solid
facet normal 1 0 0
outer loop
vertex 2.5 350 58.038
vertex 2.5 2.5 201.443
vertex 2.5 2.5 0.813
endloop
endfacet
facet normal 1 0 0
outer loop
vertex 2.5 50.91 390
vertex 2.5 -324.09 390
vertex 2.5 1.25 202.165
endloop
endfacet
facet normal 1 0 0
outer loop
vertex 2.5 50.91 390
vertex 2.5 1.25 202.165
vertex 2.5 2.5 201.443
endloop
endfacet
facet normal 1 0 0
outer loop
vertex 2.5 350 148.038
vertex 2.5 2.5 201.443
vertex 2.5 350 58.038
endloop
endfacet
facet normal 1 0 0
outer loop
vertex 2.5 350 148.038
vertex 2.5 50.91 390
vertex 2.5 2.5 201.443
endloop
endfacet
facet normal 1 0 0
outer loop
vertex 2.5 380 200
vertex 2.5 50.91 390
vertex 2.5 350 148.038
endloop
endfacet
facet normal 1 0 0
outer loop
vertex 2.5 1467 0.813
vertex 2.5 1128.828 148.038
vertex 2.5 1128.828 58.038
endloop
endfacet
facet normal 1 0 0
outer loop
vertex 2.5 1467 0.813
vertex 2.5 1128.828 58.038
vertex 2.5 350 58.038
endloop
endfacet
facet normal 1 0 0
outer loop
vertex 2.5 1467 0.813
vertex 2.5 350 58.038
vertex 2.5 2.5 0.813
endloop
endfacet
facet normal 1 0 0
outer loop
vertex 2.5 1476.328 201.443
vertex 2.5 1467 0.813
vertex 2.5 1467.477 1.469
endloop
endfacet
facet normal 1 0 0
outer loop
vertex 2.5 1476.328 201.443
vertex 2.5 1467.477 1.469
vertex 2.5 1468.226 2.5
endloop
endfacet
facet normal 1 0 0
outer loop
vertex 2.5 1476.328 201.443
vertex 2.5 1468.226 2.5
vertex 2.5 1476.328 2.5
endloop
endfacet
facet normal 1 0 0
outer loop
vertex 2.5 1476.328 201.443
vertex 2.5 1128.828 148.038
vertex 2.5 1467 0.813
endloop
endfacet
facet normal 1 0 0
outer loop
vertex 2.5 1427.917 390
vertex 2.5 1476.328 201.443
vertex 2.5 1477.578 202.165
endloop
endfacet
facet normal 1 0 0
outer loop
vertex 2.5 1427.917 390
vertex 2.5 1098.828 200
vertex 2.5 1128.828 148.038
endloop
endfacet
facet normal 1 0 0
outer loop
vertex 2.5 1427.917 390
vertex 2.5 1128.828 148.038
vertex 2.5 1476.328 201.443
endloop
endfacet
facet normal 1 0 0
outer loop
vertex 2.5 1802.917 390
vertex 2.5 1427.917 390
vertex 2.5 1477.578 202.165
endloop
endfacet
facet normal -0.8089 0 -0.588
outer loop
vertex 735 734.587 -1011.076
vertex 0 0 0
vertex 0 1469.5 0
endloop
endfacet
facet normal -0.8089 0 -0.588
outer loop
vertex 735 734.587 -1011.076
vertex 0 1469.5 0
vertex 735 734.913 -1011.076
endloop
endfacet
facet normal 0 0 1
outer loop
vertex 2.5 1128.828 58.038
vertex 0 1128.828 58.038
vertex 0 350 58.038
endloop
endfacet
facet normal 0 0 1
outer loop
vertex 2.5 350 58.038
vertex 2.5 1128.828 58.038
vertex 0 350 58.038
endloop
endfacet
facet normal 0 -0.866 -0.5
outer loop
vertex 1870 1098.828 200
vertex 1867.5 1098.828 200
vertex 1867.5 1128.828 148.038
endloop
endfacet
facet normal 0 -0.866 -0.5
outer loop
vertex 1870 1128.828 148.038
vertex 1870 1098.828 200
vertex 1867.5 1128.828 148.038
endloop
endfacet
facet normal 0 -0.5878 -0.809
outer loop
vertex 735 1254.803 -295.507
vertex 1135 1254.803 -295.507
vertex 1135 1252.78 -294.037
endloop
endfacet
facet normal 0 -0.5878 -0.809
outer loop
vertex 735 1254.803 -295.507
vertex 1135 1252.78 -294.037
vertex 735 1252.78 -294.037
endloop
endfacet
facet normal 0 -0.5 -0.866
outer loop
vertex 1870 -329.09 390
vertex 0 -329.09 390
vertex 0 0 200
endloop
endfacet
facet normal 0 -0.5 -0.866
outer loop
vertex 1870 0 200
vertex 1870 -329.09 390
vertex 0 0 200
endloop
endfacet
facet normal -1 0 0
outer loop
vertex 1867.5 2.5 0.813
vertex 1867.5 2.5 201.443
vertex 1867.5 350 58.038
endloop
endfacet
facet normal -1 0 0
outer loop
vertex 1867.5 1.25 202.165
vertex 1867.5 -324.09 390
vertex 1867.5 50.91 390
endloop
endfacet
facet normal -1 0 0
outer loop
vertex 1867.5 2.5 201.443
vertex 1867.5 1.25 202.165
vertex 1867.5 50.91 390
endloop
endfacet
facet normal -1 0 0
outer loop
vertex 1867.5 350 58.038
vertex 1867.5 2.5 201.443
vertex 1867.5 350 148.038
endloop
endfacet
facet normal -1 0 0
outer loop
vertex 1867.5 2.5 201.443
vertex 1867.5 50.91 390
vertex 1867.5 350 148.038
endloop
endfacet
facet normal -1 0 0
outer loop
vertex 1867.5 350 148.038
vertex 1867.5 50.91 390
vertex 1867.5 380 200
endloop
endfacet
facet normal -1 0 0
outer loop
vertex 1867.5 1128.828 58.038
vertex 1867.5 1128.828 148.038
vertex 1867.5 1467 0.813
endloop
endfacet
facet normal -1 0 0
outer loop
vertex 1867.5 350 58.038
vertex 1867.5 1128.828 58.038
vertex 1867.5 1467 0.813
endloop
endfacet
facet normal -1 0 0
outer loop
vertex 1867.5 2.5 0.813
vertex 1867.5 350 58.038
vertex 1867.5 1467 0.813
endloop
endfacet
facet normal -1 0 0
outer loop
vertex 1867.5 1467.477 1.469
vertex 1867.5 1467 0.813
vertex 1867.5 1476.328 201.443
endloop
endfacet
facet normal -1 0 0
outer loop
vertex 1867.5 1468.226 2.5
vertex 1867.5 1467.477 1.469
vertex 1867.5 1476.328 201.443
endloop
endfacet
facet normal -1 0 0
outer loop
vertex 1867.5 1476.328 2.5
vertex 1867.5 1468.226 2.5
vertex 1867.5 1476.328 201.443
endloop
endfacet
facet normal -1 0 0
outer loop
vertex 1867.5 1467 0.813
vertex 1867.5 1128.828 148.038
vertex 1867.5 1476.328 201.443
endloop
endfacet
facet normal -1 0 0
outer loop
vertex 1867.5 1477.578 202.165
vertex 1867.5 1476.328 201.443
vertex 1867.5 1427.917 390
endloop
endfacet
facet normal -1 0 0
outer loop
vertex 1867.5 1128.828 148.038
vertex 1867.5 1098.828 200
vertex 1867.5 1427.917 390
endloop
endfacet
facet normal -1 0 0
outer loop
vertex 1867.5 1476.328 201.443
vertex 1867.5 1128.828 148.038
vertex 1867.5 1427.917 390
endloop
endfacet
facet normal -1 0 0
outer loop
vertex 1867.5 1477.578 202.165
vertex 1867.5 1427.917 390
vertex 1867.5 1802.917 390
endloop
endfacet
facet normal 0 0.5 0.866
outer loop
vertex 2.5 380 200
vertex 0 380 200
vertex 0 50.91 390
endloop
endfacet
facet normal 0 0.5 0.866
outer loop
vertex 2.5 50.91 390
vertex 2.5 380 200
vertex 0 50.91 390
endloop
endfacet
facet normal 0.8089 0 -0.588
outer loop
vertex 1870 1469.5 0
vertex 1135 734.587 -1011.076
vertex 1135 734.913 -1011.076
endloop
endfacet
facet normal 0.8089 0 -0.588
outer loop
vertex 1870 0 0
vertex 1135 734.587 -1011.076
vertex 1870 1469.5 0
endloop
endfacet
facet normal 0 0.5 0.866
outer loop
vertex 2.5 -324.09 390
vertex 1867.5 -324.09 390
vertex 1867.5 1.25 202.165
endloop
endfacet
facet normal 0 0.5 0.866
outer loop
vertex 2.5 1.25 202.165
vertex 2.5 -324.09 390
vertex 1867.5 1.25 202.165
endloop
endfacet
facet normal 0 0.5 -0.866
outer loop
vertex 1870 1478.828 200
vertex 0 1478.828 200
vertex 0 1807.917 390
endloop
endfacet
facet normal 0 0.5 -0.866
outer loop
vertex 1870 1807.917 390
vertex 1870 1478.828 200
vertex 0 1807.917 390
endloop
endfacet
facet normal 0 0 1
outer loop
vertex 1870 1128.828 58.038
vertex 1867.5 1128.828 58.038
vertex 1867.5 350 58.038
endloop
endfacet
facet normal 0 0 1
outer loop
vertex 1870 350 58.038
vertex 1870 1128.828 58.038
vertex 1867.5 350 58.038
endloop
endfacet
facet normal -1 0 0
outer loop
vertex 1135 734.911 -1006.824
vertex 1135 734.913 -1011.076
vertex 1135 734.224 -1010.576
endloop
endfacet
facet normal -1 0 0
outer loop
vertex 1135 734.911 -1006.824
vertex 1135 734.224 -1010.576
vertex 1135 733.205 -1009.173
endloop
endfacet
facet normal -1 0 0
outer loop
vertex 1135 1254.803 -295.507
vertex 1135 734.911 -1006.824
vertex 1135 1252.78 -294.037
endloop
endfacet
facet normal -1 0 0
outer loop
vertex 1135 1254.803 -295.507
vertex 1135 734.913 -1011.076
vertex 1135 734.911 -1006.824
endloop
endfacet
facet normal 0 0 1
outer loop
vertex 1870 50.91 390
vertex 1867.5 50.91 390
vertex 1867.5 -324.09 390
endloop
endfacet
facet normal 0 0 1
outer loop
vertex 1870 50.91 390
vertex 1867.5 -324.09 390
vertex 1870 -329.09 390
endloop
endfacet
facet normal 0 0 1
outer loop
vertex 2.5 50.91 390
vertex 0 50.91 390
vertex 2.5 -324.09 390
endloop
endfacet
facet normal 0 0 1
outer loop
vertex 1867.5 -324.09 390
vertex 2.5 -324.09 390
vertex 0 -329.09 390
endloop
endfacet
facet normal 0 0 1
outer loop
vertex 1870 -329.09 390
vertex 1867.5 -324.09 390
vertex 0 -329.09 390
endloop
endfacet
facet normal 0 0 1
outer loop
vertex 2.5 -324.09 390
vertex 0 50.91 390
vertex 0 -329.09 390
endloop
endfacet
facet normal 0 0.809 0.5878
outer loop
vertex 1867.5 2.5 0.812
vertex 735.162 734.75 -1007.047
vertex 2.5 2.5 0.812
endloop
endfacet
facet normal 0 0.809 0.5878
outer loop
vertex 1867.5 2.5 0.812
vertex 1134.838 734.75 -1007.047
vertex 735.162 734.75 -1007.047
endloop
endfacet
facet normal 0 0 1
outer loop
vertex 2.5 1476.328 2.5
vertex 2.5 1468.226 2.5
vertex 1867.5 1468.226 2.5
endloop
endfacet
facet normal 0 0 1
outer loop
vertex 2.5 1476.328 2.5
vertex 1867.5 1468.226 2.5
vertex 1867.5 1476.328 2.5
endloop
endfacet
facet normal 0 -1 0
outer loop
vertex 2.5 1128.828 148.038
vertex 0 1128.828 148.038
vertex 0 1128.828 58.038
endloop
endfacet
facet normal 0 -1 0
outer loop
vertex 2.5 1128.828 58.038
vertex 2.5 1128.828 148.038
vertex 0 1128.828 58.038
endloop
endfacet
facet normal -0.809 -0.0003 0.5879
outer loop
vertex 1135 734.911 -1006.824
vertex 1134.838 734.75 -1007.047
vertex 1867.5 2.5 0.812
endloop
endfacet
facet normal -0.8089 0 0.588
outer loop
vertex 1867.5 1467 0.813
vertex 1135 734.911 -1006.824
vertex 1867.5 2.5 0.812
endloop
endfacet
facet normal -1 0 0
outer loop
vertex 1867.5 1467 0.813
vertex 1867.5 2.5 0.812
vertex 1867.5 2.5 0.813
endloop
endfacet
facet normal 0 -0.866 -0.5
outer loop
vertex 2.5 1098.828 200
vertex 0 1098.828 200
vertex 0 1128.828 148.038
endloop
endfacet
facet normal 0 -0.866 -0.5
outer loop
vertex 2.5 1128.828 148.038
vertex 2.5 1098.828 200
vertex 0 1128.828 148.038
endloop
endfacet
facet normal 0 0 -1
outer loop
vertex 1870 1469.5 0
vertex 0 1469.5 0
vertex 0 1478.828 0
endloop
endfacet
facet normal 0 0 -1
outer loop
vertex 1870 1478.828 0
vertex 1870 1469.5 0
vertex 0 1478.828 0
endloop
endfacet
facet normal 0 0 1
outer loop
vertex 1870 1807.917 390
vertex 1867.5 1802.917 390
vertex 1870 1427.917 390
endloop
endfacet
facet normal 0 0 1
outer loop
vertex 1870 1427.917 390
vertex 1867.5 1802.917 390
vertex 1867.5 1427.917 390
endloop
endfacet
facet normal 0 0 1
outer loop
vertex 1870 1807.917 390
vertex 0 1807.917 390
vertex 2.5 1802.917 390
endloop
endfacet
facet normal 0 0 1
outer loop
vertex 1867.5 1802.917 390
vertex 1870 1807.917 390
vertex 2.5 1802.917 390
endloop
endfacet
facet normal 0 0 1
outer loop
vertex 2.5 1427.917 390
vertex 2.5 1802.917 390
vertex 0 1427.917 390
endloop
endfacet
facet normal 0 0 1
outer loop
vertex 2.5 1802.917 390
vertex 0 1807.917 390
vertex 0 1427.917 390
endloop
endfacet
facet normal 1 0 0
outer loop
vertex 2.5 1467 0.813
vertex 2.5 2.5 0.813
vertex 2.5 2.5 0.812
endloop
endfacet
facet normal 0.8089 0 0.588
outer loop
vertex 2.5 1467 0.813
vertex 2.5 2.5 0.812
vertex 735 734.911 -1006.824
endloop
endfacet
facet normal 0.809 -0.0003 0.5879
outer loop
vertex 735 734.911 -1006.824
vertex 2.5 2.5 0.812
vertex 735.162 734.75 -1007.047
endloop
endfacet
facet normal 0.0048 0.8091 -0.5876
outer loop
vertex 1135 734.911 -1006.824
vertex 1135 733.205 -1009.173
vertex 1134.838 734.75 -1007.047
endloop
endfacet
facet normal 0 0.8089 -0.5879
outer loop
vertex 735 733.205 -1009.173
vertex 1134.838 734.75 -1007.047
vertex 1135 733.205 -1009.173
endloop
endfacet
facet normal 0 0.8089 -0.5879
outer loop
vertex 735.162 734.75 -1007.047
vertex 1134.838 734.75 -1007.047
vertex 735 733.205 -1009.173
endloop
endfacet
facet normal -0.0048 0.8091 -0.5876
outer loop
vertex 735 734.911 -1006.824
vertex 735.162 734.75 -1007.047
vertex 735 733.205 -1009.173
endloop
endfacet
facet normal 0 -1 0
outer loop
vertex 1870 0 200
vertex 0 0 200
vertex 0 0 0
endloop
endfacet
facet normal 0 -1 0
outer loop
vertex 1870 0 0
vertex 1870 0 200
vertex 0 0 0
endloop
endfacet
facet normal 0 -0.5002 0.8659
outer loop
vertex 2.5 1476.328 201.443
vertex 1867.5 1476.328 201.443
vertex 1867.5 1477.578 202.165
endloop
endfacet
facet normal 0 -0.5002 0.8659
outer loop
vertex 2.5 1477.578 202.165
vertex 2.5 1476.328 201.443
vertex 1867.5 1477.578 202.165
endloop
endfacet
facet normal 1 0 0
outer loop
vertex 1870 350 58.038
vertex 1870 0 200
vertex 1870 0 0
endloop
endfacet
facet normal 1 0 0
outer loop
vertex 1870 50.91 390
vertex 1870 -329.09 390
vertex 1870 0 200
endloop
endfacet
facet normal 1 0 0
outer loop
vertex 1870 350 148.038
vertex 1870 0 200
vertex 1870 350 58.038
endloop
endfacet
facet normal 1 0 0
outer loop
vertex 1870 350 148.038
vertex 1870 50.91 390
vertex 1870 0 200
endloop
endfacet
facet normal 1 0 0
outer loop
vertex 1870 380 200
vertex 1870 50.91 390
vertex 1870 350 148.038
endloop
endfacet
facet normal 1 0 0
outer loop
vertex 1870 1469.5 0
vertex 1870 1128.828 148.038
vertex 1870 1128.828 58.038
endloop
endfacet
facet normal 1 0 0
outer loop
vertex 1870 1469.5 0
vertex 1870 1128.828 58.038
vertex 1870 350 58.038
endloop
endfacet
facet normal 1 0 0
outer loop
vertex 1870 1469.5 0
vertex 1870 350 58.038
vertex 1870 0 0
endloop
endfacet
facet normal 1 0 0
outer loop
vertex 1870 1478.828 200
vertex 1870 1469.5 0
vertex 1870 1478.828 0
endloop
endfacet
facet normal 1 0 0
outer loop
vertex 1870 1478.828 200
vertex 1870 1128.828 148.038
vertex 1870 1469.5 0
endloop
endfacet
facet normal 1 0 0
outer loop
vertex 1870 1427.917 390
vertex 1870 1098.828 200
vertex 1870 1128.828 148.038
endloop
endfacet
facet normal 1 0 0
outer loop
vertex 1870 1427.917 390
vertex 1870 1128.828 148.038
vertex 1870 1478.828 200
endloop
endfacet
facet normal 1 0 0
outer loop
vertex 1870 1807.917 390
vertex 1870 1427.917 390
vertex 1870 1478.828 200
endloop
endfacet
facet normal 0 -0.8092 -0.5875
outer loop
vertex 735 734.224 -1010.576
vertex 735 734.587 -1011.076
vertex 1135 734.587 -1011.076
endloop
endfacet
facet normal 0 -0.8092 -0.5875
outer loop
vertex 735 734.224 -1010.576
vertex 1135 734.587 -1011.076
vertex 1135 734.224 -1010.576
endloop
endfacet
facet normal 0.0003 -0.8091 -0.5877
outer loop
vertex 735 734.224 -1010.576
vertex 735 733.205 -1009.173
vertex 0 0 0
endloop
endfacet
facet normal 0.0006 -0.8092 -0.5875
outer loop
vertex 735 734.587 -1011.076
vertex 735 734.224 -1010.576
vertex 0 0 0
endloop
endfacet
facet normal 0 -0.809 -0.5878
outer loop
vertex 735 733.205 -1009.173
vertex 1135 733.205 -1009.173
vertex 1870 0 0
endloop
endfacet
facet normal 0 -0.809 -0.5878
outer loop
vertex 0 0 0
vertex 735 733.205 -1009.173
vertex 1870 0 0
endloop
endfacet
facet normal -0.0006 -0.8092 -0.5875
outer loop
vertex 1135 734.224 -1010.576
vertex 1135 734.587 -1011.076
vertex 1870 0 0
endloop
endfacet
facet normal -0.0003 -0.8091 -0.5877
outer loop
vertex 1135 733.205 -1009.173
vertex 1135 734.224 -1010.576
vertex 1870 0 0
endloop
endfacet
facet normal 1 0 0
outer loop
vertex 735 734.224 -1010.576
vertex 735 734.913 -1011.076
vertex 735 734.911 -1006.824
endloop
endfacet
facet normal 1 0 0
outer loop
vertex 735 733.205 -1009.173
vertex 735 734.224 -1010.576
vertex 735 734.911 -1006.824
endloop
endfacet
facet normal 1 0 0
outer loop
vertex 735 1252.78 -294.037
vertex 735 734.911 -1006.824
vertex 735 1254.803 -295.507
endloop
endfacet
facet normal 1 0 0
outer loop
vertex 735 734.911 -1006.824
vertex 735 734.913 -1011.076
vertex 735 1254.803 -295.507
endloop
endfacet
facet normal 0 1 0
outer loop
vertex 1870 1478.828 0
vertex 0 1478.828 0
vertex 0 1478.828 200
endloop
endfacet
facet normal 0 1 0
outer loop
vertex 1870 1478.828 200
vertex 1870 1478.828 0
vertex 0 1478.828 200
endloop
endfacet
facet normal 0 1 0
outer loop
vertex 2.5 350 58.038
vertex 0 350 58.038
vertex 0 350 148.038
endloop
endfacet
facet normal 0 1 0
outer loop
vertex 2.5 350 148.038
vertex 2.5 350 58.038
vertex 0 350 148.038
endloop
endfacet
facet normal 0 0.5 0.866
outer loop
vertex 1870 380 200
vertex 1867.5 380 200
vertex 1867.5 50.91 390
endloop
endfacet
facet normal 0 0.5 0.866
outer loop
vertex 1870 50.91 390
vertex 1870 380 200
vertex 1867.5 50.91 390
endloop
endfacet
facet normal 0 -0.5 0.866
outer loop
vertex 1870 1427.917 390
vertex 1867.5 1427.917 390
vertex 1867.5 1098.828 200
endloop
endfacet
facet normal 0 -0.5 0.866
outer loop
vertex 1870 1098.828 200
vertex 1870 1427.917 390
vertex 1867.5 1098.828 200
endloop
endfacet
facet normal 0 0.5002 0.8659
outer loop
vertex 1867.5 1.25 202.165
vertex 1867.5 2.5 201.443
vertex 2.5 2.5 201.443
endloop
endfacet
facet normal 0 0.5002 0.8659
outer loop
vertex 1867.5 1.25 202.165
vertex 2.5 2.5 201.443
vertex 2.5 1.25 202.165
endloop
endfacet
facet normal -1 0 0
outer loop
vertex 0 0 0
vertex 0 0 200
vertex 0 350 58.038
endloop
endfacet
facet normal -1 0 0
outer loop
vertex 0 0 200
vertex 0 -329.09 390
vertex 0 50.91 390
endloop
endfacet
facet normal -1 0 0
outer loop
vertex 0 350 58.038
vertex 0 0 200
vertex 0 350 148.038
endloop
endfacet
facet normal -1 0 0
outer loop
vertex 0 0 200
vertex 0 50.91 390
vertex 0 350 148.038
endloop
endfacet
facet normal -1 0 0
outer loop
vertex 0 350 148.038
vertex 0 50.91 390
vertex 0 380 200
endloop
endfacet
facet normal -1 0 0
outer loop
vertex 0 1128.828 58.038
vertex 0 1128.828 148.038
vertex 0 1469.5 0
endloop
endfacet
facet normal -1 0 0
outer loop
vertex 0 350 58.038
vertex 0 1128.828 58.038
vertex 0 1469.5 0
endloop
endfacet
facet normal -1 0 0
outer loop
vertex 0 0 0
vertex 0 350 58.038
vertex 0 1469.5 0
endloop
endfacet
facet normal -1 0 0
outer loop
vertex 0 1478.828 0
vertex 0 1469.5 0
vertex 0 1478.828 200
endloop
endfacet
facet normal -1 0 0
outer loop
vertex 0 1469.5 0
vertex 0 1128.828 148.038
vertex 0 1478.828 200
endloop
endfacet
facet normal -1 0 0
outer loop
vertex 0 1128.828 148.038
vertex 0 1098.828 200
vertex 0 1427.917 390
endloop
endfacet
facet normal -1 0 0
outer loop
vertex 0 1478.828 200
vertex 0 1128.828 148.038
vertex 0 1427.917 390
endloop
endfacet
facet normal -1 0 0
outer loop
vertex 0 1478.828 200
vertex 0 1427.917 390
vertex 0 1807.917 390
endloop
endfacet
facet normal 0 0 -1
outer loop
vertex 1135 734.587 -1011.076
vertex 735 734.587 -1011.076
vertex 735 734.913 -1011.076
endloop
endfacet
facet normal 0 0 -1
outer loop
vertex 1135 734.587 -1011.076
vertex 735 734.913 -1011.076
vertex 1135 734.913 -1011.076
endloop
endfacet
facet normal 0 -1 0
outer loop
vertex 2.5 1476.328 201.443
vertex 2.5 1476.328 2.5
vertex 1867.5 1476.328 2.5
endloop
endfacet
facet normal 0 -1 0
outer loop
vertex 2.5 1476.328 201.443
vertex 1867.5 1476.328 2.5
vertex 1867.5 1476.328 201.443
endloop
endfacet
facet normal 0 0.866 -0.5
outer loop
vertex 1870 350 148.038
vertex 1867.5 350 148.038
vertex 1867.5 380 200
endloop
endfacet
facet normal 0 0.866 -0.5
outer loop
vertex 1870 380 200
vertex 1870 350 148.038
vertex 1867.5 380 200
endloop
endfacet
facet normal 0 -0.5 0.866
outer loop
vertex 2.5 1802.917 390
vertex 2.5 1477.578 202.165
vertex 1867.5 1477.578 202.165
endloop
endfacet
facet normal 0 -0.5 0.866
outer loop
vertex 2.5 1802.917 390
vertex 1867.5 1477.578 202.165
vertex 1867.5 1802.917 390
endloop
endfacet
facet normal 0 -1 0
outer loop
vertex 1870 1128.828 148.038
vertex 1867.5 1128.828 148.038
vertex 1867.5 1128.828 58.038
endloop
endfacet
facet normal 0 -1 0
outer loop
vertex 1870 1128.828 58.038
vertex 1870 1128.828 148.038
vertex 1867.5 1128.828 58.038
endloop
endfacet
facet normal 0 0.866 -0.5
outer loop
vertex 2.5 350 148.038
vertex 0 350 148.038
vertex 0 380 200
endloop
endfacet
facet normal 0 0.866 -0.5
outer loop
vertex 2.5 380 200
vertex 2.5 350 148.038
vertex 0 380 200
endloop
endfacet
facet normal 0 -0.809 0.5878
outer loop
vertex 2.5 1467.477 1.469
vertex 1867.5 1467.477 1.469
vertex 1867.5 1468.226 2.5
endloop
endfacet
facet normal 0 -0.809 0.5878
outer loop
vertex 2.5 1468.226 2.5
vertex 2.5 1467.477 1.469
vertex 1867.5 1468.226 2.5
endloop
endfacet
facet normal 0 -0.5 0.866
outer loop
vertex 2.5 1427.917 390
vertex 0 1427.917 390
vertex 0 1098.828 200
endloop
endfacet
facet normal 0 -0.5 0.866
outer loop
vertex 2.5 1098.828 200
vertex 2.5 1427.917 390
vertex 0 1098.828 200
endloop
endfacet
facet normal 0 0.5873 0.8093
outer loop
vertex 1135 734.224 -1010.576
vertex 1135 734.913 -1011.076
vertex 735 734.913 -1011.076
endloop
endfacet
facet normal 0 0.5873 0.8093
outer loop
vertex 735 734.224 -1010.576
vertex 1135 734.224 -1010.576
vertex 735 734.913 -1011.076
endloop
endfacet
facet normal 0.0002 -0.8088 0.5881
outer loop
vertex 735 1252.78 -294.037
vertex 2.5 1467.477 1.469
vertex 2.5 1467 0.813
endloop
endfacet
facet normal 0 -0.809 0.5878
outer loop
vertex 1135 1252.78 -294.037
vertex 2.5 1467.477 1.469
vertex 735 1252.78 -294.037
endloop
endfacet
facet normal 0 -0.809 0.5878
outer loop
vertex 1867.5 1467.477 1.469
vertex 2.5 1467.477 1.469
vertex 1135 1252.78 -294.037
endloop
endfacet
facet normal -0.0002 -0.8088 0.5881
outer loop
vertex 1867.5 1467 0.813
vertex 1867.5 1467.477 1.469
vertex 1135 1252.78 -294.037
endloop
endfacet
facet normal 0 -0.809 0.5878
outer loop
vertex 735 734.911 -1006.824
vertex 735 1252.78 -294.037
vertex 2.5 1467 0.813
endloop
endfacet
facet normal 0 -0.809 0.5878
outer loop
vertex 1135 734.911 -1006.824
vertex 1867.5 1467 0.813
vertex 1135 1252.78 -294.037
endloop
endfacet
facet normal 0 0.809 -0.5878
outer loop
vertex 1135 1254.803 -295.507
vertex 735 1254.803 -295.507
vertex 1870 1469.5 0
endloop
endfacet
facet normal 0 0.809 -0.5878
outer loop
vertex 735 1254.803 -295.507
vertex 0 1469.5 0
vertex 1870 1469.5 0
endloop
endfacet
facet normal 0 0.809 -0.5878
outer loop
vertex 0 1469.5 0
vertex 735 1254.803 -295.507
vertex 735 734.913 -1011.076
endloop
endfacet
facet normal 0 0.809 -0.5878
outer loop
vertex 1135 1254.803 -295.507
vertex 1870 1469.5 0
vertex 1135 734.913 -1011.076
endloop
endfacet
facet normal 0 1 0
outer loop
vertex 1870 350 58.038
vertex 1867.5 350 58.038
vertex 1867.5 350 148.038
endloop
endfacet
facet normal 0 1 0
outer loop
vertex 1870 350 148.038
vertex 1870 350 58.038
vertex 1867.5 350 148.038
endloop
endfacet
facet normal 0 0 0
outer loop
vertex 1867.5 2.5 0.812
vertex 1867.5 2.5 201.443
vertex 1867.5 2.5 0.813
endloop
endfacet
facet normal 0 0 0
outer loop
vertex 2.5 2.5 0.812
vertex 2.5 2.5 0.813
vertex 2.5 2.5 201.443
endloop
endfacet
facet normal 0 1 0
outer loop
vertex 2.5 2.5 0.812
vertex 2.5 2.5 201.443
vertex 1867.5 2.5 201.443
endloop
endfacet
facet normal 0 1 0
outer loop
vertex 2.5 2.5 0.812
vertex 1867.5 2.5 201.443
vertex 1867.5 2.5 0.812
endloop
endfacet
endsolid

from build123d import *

# Parameters (mm, degrees)
F0_W        = 1870
F0_H        = 1469.5
F1_DEPTH    = 1011.3
F3_DEPTH    = 1870.001
F6_DEPTH    = 1469.501
F8_DEPTH    = 1870
F9_T        = 2.5
F9_T3_DEPTH = 1875
F10_W       = 400
F10_H       = 884.4916457885
F11_DEPTH   = 2.5


# Not quite as in the source:
# - a shell that OpenCascade refuses in one call is made with other operations: the cavity is built on its own and cut out


with BuildPart() as f1:
    # F0 (on Top) → F1 (new body)
    with BuildSketch(Plane.XY):
        with Locations((935, 734.75)):
            Rectangle(F0_W, F0_H)
    extrude(amount=-F1_DEPTH)

    # F2 (on face) → F3 (cut, through all)
    with BuildSketch(Plane.YZ.offset(1870)):
        Polygon((734.75, -1011.3), (0, 0), (0, -1011.3), align=None)
        Polygon((1469.5, 0), (734.75, -1011.3), (1469.5, -1011.3), align=None)
    extrude(amount=-F3_DEPTH, mode=Mode.SUBTRACT)

    # F5 (on face) → F6 (cut, through all)
    with BuildSketch(Plane(origin=(0, 0, 0), x_dir=(-1, 0, 0), z_dir=(0, 1, 0))):
        Polygon((0, -1011.0761593471), (0, 0), (-735, -1011.0761593471), (-1135, -1011.0761593471), (-1870, 0), (-1870, -1118.932723999), (0, -1118.932723999), align=None)
    extrude(amount=F6_DEPTH, mode=Mode.SUBTRACT)

    # F7 (on Right) → F8 (join)
    with BuildSketch(Plane.YZ):
        Polygon((0, 200), (0, 0), (739.4138846406, 0), (739.4138846406, 58.0384757729), (350, 58.0384757729), (350, 148.0384757729), (380, 200), (50.9103465619, 390), (-329.0896534381, 390), align=None)
        Polygon((739.4138846406, 58.0384757729), (739.4138846406, 0), (1478.8277692812, 0), (1478.8277692812, 200), (1807.9174227193, 390), (1427.9174227193, 390), (1098.8277692812, 200), (1128.8277692812, 148.0384757729), (1128.8277692812, 58.0384757729), align=None)
    extrude(amount=F8_DEPTH)

    # F9: shell of thickness 2.5, made by hand


with BuildPart() as f9_core1:
    # F9_t2: copy of F1
    add(f1.part)

    # the walls: a layer under each face that stays
    f9_faces = [f9_core1.faces().sort_by_distance(p)[0] for p in [
        (367.5, 734.75, -505.5380796735),
        (0, 27.0781925881, 65),
        (935, 367.2936853952, -505.5380796735),
        (935, 734.75, -1011.0761593471),
        (935, 1102.2063146048, -505.5380796735),
        (935, 0, 100),
        (935, 1474.1638846406, 0),
        (935, 1478.8277692812, 100),
        (935, 1643.3725960003, 295),
        (935, -164.544826719, 295),
        (1502.5, 734.75, -505.5380796735),
        (1870, 27.0781925881, 65),
    ]]
    thicken(f9_faces, amount=-F9_T, mode=Mode.SUBTRACT)

    # F9_s4 → F9_t3 (cut)
    with BuildSketch(Plane.YZ.offset(-2.5)):
        Polygon((1469.5202254482, -0.0396945991), (1467.4774551759, 1.4694599125), (1468.2261838709, 2.5), (1469.5, 2.5), align=None)
        Polygon((-0.0375, 199.9783493649), (2.5, 200), (2.5, 201.443375673), (1.25, 202.1650635095), align=None)
        Polygon((1478.8652692812, 199.9783493649), (1476.3277692812, 200), (1476.3277692812, 201.443375673), (1477.5777692812, 202.1650635095), align=None)
    extrude(amount=F9_T3_DEPTH, mode=Mode.SUBTRACT)


with BuildPart() as f1_1:
    add(f1.part)

    # what is left inside the walls is the cavity
    f9_cavity = [f9_core1.part.solids().sort_by_distance(p)[0] for p in [
        (1245.833333, 739.413885, 58.013476),
    ]]
    add(f9_cavity, mode=Mode.SUBTRACT)

    # F10 (on face) → F11 (cut)
    with BuildSketch(Plane(origin=(0, 961.8024604101, -698.7880527898), x_dir=(-1, 0, 0), z_dir=(0, 0.8090179296, -0.587783965))):
        with Locations((-935, 56.236940873)):
            Rectangle(F10_W, F10_H)
    extrude(amount=-F11_DEPTH, mode=Mode.SUBTRACT)


solid = f1_1.part
